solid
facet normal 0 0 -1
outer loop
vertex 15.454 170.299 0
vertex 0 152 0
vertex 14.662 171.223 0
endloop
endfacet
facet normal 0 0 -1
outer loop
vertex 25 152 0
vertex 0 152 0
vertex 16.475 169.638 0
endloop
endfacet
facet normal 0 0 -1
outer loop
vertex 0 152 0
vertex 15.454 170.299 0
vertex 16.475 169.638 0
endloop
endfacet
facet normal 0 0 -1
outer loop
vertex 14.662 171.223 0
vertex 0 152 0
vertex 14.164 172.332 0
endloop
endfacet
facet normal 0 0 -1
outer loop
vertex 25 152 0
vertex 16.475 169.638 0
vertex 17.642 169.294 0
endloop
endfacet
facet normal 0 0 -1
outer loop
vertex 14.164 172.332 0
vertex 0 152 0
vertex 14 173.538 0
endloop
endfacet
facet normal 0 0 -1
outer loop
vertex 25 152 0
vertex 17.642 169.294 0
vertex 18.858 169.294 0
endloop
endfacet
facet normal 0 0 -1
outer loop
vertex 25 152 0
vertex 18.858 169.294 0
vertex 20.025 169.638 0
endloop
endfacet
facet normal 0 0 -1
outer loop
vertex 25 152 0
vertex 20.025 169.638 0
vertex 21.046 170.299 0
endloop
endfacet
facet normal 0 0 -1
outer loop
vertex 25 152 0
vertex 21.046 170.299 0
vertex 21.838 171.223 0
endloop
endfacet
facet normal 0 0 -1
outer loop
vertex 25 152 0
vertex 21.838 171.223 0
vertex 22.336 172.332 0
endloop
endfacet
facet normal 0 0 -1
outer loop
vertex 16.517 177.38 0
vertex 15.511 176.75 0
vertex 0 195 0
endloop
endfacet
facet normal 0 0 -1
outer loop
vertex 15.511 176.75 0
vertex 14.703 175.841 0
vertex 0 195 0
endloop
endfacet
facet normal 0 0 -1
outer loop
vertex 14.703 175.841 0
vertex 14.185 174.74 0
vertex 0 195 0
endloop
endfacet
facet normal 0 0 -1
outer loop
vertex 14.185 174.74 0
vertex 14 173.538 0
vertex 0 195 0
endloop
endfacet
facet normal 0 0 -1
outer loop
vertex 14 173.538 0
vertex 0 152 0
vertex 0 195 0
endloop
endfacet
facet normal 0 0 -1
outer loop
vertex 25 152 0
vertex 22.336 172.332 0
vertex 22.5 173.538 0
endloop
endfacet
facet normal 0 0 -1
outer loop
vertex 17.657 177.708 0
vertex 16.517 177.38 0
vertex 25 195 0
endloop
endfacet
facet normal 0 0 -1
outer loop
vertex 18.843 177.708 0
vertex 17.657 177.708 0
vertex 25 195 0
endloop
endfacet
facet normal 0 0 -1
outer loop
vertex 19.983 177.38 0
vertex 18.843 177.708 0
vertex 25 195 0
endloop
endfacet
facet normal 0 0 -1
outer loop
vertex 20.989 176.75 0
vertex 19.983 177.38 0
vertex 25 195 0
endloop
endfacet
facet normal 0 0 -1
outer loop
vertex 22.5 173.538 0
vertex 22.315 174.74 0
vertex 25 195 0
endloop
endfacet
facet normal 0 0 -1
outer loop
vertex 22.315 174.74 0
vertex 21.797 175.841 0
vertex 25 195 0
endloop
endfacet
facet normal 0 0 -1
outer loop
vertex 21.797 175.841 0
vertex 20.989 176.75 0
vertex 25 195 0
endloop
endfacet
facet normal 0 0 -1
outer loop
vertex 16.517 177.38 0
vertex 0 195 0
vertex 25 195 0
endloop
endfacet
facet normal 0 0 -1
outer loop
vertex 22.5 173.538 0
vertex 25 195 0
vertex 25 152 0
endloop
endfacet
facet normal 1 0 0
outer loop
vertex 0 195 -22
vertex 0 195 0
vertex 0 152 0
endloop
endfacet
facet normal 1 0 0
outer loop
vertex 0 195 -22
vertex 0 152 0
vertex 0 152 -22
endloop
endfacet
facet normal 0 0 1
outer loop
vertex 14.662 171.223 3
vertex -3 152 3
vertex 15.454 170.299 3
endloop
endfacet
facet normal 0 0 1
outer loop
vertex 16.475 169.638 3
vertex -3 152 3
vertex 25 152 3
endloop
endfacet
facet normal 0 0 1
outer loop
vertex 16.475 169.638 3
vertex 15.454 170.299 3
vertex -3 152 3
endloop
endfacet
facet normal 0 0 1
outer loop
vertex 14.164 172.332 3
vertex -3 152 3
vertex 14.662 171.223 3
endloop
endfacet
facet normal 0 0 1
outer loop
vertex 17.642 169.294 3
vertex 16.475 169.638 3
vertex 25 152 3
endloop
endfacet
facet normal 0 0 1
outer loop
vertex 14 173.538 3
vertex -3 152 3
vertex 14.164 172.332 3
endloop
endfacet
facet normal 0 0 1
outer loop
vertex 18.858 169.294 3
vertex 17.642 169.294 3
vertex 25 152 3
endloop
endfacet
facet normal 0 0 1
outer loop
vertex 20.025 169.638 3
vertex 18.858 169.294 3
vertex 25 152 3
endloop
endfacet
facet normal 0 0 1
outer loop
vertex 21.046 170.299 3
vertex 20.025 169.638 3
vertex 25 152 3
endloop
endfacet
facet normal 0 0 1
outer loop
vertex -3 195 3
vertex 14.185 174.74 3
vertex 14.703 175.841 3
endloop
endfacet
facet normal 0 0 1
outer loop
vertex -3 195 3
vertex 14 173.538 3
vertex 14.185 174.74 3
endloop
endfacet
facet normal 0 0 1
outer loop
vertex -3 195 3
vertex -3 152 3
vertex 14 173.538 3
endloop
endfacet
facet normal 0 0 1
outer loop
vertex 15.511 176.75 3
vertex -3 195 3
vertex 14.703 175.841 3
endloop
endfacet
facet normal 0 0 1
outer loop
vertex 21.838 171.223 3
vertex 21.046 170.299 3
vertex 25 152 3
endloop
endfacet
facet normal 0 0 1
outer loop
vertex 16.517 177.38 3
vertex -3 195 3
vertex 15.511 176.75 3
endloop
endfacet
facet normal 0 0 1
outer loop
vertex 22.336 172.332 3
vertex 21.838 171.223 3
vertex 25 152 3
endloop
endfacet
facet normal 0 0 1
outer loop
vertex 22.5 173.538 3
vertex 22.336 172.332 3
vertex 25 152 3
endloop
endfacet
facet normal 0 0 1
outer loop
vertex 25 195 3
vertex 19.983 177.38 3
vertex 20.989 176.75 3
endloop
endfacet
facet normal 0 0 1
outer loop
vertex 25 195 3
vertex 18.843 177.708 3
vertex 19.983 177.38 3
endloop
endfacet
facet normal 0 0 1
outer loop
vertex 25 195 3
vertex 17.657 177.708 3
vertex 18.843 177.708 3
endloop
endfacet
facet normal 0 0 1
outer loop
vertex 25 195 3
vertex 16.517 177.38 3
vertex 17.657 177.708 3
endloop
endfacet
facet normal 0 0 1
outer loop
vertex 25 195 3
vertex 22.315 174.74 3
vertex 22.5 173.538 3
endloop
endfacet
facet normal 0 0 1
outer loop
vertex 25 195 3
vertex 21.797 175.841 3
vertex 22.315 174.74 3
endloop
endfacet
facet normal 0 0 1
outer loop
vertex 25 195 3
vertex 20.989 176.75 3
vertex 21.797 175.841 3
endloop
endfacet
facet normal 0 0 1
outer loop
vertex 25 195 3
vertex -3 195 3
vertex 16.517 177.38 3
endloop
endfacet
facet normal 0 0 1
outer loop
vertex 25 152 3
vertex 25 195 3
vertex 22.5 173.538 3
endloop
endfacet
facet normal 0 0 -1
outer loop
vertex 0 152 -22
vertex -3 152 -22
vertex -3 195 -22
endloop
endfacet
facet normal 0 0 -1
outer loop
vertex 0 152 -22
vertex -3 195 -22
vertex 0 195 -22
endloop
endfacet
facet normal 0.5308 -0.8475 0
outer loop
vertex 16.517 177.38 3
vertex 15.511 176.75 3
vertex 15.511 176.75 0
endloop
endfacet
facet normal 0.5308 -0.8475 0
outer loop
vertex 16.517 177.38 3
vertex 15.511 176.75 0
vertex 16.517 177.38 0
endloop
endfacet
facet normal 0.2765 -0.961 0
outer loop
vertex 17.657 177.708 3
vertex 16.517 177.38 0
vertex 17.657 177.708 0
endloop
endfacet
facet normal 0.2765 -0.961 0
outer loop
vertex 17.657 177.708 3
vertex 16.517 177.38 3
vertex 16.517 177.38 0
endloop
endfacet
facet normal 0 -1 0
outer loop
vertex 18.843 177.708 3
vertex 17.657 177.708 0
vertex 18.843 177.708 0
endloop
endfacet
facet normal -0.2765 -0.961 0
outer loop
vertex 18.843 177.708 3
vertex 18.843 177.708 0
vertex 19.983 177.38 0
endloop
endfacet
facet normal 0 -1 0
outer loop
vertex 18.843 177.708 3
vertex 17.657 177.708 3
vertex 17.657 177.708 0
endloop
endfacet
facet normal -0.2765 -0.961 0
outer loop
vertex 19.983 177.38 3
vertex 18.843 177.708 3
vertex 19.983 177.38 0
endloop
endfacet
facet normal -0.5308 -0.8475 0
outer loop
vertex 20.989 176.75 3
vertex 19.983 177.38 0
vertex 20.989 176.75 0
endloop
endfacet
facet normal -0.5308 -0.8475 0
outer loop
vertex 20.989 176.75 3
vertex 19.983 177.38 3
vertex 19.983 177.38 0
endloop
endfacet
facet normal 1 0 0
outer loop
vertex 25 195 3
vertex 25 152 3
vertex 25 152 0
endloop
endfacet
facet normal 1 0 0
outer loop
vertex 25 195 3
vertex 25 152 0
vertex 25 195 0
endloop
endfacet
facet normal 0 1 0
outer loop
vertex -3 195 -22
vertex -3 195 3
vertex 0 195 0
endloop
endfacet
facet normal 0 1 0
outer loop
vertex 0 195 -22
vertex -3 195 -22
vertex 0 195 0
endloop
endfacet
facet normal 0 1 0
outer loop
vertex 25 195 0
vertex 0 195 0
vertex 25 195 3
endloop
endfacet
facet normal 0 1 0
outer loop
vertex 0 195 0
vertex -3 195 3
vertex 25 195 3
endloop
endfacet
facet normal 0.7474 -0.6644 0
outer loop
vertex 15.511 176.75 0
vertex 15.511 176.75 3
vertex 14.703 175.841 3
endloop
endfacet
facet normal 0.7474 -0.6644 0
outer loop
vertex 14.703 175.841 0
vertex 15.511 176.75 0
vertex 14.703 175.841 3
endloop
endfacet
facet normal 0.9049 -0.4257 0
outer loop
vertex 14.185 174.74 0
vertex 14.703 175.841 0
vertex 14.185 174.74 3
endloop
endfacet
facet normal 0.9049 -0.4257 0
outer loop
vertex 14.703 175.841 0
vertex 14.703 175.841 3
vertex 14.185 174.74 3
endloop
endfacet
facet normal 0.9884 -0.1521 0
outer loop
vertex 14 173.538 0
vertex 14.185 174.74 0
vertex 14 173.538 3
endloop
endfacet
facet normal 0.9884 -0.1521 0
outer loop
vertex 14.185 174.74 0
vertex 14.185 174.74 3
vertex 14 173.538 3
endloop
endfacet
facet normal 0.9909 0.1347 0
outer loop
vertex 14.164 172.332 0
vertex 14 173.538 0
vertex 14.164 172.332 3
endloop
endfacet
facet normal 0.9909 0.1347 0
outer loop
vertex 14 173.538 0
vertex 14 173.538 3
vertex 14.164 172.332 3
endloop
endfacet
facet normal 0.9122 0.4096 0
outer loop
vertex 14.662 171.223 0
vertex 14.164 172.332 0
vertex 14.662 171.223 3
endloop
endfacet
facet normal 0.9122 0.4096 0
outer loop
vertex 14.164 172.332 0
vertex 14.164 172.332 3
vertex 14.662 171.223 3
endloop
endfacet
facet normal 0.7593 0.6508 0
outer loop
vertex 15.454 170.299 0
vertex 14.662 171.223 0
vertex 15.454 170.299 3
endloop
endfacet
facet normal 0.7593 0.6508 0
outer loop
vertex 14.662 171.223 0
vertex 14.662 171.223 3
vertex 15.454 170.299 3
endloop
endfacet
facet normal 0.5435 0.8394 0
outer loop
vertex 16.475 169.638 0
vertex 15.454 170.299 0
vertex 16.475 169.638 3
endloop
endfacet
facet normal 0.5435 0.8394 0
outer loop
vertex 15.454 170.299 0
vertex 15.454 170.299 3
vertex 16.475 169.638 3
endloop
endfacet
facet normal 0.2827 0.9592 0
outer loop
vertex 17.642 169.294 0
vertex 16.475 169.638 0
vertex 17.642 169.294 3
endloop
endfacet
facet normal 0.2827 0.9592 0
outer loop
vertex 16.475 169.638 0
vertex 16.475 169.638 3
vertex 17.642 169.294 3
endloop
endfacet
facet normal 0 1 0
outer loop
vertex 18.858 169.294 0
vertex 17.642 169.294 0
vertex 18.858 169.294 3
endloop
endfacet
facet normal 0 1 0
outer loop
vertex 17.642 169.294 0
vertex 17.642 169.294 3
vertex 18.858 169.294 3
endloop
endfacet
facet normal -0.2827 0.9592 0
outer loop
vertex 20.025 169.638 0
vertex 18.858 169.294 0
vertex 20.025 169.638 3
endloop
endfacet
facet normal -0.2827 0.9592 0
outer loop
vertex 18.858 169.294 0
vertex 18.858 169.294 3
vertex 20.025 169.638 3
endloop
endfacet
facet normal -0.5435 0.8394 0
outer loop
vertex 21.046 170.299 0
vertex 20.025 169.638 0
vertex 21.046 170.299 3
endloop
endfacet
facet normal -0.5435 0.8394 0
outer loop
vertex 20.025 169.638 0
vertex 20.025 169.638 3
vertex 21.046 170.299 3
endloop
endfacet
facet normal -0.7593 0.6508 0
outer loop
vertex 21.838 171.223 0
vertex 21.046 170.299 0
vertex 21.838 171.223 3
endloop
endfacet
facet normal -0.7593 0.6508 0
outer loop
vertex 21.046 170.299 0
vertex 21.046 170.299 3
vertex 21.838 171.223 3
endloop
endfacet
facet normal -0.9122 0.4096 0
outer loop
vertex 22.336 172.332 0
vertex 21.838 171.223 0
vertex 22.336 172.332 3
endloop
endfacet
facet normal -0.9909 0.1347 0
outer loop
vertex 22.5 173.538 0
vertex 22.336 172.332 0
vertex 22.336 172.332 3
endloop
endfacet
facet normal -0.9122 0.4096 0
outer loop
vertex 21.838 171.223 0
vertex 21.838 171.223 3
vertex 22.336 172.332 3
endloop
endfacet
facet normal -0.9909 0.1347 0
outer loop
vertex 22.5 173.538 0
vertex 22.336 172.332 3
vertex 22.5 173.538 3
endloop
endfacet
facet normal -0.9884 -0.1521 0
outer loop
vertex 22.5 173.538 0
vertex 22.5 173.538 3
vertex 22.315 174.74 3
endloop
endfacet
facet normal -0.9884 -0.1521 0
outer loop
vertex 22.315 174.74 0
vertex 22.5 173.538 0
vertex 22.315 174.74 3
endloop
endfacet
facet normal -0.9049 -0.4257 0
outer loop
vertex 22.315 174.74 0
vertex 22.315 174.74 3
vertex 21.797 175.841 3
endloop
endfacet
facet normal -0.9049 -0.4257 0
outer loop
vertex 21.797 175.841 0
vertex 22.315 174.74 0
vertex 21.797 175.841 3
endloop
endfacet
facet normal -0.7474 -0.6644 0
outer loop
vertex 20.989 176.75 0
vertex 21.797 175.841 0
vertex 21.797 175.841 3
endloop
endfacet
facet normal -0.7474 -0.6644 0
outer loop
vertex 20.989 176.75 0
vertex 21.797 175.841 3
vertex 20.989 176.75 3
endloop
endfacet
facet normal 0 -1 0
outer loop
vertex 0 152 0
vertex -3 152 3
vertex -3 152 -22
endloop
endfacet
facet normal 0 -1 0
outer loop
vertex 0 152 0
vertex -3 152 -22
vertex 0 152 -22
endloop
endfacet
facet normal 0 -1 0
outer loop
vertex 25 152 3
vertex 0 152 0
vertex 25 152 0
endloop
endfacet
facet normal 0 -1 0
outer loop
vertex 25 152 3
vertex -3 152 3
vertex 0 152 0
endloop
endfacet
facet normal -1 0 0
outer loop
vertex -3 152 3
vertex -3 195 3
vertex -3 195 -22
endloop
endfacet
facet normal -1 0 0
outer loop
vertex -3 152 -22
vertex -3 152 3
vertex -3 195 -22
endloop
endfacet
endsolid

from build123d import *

# Parameters (mm, degrees)
CROQUIS1_W              = 25
CROQUIS1_H              = 3
SALIENTE_EXTRUIR1_DEPTH = 195
CROQUIS2_R              = 4.25
CORTAR_EXTRUIR1_DEPTH   = 195
CROQUIS3_W              = 4
CROQUIS3_H              = 25
SALIENTE_EXTRUIR2_DEPTH = 195
SALIENTE_EXTRUIR3_START = 1
CROQUIS4_W              = 29
CROQUIS4_H              = 195
CROQUIS4_R              = 4.25
SALIENTE_EXTRUIR3_DEPTH = 1
CROQUIS5_W              = 149.811438776
CROQUIS5_H              = 152
CORTAR_EXTRUIR4_DEPTH   = 40
CROQUIS6_R              = 4.25
CORTAR_EXTRUIR5_DEPTH   = 40
SALIENTE_EXTRUIR4_DEPTH = 4
CROQUIS8_W              = 1
CROQUIS8_H              = 26
CORTAR_EXTRUIR6_DEPTH   = 60
CROQUIS9_W              = 28
CROQUIS9_H              = 1
CORTAR_EXTRUIR7_DEPTH   = 60


with BuildPart() as part:
    # Croquis1 → Saliente-Extruir1 (new body)
    with BuildSketch(Plane(origin=(0, 0, 0), x_dir=(1, 0, 0), z_dir=(0, 1, 0))):
        with Locations((12.5, -1.5)):
            Rectangle(CROQUIS1_W, CROQUIS1_H)
    extrude(amount=SALIENTE_EXTRUIR1_DEPTH)

    # Croquis2 → Cortar-Extruir1 (cut)
    with BuildSketch(Plane.XY.offset(3)):
        with Locations((18.25, 180)):
            Circle(CROQUIS2_R)
        with Locations((18.25, 97.5)):
            Circle(CROQUIS2_R)
        with Locations((18.25, 15)):
            Circle(CROQUIS2_R)
    extrude(amount=-CORTAR_EXTRUIR1_DEPTH, mode=Mode.SUBTRACT)

    # Croquis3 → Saliente-Extruir2 (add)
    with BuildSketch(Plane(origin=(0, 195, 0), x_dir=(1, 0, 0), z_dir=(0, 1, 0))):
        with Locations((-2, 9.5)):
            Rectangle(CROQUIS3_W, CROQUIS3_H)
    extrude(amount=-SALIENTE_EXTRUIR2_DEPTH)

    # Croquis4 → Saliente-Extruir3 (add)
    with BuildSketch(Plane.XY.offset(3).offset(SALIENTE_EXTRUIR3_START)):
        with Locations((10.5, 97.5)):
            Rectangle(CROQUIS4_W, CROQUIS4_H)
        with Locations((18.25, 15)):
            Circle(CROQUIS4_R, mode=Mode.SUBTRACT)
        with Locations((18.25, 97.5)):
            Circle(CROQUIS4_R, mode=Mode.SUBTRACT)
        with Locations((18.25, 180)):
            Circle(CROQUIS4_R, mode=Mode.SUBTRACT)
    extrude(amount=-SALIENTE_EXTRUIR3_DEPTH)

    # Croquis5 → Cortar-Extruir4 (cut)
    with BuildSketch(Plane.XY.offset(4)):
        with Locations((-49.905719388, 76)):
            Rectangle(CROQUIS5_W, CROQUIS5_H)
    extrude(amount=-CORTAR_EXTRUIR4_DEPTH, mode=Mode.SUBTRACT)

    # Croquis6 → Cortar-Extruir5 (cut)
    with BuildSketch(Plane.XY.offset(4)):
        with Locations((18.25, 173.5)):
            Circle(CROQUIS6_R)
    extrude(amount=-CORTAR_EXTRUIR5_DEPTH, mode=Mode.SUBTRACT)

    # Croquis7 → Saliente-Extruir4 (add)
    with BuildSketch(Plane.XY.offset(4)):
        with BuildLine():
            ThreePointArc((20.988612788, 176.75), (22.103673854, 178.207878959), (22.5, 180))
            ThreePointArc((22.5, 180), (16.457878959, 183.853673854), (15.511387212, 176.75))
            ThreePointArc((15.511387212, 176.75), (18.25, 177.75), (20.988612788, 176.75))
        make_face()
    extrude(amount=-SALIENTE_EXTRUIR4_DEPTH)

    # Croquis8 → Cortar-Extruir6 (cut)
    with BuildSketch(Plane(origin=(0, 195, 0), x_dir=(1, 0, 0), z_dir=(0, 1, 0))):
        with Locations((-3.5, 9)):
            Rectangle(CROQUIS8_W, CROQUIS8_H)
    extrude(amount=-CORTAR_EXTRUIR6_DEPTH, mode=Mode.SUBTRACT)

    # Croquis9 → Cortar-Extruir7 (cut)
    with BuildSketch(Plane(origin=(0, 195, 0), x_dir=(1, 0, 0), z_dir=(0, 1, 0))):
        with Locations((11, -3.5)):
            Rectangle(CROQUIS9_W, CROQUIS9_H)
    extrude(amount=-CORTAR_EXTRUIR7_DEPTH, mode=Mode.SUBTRACT)


solid = part.part
